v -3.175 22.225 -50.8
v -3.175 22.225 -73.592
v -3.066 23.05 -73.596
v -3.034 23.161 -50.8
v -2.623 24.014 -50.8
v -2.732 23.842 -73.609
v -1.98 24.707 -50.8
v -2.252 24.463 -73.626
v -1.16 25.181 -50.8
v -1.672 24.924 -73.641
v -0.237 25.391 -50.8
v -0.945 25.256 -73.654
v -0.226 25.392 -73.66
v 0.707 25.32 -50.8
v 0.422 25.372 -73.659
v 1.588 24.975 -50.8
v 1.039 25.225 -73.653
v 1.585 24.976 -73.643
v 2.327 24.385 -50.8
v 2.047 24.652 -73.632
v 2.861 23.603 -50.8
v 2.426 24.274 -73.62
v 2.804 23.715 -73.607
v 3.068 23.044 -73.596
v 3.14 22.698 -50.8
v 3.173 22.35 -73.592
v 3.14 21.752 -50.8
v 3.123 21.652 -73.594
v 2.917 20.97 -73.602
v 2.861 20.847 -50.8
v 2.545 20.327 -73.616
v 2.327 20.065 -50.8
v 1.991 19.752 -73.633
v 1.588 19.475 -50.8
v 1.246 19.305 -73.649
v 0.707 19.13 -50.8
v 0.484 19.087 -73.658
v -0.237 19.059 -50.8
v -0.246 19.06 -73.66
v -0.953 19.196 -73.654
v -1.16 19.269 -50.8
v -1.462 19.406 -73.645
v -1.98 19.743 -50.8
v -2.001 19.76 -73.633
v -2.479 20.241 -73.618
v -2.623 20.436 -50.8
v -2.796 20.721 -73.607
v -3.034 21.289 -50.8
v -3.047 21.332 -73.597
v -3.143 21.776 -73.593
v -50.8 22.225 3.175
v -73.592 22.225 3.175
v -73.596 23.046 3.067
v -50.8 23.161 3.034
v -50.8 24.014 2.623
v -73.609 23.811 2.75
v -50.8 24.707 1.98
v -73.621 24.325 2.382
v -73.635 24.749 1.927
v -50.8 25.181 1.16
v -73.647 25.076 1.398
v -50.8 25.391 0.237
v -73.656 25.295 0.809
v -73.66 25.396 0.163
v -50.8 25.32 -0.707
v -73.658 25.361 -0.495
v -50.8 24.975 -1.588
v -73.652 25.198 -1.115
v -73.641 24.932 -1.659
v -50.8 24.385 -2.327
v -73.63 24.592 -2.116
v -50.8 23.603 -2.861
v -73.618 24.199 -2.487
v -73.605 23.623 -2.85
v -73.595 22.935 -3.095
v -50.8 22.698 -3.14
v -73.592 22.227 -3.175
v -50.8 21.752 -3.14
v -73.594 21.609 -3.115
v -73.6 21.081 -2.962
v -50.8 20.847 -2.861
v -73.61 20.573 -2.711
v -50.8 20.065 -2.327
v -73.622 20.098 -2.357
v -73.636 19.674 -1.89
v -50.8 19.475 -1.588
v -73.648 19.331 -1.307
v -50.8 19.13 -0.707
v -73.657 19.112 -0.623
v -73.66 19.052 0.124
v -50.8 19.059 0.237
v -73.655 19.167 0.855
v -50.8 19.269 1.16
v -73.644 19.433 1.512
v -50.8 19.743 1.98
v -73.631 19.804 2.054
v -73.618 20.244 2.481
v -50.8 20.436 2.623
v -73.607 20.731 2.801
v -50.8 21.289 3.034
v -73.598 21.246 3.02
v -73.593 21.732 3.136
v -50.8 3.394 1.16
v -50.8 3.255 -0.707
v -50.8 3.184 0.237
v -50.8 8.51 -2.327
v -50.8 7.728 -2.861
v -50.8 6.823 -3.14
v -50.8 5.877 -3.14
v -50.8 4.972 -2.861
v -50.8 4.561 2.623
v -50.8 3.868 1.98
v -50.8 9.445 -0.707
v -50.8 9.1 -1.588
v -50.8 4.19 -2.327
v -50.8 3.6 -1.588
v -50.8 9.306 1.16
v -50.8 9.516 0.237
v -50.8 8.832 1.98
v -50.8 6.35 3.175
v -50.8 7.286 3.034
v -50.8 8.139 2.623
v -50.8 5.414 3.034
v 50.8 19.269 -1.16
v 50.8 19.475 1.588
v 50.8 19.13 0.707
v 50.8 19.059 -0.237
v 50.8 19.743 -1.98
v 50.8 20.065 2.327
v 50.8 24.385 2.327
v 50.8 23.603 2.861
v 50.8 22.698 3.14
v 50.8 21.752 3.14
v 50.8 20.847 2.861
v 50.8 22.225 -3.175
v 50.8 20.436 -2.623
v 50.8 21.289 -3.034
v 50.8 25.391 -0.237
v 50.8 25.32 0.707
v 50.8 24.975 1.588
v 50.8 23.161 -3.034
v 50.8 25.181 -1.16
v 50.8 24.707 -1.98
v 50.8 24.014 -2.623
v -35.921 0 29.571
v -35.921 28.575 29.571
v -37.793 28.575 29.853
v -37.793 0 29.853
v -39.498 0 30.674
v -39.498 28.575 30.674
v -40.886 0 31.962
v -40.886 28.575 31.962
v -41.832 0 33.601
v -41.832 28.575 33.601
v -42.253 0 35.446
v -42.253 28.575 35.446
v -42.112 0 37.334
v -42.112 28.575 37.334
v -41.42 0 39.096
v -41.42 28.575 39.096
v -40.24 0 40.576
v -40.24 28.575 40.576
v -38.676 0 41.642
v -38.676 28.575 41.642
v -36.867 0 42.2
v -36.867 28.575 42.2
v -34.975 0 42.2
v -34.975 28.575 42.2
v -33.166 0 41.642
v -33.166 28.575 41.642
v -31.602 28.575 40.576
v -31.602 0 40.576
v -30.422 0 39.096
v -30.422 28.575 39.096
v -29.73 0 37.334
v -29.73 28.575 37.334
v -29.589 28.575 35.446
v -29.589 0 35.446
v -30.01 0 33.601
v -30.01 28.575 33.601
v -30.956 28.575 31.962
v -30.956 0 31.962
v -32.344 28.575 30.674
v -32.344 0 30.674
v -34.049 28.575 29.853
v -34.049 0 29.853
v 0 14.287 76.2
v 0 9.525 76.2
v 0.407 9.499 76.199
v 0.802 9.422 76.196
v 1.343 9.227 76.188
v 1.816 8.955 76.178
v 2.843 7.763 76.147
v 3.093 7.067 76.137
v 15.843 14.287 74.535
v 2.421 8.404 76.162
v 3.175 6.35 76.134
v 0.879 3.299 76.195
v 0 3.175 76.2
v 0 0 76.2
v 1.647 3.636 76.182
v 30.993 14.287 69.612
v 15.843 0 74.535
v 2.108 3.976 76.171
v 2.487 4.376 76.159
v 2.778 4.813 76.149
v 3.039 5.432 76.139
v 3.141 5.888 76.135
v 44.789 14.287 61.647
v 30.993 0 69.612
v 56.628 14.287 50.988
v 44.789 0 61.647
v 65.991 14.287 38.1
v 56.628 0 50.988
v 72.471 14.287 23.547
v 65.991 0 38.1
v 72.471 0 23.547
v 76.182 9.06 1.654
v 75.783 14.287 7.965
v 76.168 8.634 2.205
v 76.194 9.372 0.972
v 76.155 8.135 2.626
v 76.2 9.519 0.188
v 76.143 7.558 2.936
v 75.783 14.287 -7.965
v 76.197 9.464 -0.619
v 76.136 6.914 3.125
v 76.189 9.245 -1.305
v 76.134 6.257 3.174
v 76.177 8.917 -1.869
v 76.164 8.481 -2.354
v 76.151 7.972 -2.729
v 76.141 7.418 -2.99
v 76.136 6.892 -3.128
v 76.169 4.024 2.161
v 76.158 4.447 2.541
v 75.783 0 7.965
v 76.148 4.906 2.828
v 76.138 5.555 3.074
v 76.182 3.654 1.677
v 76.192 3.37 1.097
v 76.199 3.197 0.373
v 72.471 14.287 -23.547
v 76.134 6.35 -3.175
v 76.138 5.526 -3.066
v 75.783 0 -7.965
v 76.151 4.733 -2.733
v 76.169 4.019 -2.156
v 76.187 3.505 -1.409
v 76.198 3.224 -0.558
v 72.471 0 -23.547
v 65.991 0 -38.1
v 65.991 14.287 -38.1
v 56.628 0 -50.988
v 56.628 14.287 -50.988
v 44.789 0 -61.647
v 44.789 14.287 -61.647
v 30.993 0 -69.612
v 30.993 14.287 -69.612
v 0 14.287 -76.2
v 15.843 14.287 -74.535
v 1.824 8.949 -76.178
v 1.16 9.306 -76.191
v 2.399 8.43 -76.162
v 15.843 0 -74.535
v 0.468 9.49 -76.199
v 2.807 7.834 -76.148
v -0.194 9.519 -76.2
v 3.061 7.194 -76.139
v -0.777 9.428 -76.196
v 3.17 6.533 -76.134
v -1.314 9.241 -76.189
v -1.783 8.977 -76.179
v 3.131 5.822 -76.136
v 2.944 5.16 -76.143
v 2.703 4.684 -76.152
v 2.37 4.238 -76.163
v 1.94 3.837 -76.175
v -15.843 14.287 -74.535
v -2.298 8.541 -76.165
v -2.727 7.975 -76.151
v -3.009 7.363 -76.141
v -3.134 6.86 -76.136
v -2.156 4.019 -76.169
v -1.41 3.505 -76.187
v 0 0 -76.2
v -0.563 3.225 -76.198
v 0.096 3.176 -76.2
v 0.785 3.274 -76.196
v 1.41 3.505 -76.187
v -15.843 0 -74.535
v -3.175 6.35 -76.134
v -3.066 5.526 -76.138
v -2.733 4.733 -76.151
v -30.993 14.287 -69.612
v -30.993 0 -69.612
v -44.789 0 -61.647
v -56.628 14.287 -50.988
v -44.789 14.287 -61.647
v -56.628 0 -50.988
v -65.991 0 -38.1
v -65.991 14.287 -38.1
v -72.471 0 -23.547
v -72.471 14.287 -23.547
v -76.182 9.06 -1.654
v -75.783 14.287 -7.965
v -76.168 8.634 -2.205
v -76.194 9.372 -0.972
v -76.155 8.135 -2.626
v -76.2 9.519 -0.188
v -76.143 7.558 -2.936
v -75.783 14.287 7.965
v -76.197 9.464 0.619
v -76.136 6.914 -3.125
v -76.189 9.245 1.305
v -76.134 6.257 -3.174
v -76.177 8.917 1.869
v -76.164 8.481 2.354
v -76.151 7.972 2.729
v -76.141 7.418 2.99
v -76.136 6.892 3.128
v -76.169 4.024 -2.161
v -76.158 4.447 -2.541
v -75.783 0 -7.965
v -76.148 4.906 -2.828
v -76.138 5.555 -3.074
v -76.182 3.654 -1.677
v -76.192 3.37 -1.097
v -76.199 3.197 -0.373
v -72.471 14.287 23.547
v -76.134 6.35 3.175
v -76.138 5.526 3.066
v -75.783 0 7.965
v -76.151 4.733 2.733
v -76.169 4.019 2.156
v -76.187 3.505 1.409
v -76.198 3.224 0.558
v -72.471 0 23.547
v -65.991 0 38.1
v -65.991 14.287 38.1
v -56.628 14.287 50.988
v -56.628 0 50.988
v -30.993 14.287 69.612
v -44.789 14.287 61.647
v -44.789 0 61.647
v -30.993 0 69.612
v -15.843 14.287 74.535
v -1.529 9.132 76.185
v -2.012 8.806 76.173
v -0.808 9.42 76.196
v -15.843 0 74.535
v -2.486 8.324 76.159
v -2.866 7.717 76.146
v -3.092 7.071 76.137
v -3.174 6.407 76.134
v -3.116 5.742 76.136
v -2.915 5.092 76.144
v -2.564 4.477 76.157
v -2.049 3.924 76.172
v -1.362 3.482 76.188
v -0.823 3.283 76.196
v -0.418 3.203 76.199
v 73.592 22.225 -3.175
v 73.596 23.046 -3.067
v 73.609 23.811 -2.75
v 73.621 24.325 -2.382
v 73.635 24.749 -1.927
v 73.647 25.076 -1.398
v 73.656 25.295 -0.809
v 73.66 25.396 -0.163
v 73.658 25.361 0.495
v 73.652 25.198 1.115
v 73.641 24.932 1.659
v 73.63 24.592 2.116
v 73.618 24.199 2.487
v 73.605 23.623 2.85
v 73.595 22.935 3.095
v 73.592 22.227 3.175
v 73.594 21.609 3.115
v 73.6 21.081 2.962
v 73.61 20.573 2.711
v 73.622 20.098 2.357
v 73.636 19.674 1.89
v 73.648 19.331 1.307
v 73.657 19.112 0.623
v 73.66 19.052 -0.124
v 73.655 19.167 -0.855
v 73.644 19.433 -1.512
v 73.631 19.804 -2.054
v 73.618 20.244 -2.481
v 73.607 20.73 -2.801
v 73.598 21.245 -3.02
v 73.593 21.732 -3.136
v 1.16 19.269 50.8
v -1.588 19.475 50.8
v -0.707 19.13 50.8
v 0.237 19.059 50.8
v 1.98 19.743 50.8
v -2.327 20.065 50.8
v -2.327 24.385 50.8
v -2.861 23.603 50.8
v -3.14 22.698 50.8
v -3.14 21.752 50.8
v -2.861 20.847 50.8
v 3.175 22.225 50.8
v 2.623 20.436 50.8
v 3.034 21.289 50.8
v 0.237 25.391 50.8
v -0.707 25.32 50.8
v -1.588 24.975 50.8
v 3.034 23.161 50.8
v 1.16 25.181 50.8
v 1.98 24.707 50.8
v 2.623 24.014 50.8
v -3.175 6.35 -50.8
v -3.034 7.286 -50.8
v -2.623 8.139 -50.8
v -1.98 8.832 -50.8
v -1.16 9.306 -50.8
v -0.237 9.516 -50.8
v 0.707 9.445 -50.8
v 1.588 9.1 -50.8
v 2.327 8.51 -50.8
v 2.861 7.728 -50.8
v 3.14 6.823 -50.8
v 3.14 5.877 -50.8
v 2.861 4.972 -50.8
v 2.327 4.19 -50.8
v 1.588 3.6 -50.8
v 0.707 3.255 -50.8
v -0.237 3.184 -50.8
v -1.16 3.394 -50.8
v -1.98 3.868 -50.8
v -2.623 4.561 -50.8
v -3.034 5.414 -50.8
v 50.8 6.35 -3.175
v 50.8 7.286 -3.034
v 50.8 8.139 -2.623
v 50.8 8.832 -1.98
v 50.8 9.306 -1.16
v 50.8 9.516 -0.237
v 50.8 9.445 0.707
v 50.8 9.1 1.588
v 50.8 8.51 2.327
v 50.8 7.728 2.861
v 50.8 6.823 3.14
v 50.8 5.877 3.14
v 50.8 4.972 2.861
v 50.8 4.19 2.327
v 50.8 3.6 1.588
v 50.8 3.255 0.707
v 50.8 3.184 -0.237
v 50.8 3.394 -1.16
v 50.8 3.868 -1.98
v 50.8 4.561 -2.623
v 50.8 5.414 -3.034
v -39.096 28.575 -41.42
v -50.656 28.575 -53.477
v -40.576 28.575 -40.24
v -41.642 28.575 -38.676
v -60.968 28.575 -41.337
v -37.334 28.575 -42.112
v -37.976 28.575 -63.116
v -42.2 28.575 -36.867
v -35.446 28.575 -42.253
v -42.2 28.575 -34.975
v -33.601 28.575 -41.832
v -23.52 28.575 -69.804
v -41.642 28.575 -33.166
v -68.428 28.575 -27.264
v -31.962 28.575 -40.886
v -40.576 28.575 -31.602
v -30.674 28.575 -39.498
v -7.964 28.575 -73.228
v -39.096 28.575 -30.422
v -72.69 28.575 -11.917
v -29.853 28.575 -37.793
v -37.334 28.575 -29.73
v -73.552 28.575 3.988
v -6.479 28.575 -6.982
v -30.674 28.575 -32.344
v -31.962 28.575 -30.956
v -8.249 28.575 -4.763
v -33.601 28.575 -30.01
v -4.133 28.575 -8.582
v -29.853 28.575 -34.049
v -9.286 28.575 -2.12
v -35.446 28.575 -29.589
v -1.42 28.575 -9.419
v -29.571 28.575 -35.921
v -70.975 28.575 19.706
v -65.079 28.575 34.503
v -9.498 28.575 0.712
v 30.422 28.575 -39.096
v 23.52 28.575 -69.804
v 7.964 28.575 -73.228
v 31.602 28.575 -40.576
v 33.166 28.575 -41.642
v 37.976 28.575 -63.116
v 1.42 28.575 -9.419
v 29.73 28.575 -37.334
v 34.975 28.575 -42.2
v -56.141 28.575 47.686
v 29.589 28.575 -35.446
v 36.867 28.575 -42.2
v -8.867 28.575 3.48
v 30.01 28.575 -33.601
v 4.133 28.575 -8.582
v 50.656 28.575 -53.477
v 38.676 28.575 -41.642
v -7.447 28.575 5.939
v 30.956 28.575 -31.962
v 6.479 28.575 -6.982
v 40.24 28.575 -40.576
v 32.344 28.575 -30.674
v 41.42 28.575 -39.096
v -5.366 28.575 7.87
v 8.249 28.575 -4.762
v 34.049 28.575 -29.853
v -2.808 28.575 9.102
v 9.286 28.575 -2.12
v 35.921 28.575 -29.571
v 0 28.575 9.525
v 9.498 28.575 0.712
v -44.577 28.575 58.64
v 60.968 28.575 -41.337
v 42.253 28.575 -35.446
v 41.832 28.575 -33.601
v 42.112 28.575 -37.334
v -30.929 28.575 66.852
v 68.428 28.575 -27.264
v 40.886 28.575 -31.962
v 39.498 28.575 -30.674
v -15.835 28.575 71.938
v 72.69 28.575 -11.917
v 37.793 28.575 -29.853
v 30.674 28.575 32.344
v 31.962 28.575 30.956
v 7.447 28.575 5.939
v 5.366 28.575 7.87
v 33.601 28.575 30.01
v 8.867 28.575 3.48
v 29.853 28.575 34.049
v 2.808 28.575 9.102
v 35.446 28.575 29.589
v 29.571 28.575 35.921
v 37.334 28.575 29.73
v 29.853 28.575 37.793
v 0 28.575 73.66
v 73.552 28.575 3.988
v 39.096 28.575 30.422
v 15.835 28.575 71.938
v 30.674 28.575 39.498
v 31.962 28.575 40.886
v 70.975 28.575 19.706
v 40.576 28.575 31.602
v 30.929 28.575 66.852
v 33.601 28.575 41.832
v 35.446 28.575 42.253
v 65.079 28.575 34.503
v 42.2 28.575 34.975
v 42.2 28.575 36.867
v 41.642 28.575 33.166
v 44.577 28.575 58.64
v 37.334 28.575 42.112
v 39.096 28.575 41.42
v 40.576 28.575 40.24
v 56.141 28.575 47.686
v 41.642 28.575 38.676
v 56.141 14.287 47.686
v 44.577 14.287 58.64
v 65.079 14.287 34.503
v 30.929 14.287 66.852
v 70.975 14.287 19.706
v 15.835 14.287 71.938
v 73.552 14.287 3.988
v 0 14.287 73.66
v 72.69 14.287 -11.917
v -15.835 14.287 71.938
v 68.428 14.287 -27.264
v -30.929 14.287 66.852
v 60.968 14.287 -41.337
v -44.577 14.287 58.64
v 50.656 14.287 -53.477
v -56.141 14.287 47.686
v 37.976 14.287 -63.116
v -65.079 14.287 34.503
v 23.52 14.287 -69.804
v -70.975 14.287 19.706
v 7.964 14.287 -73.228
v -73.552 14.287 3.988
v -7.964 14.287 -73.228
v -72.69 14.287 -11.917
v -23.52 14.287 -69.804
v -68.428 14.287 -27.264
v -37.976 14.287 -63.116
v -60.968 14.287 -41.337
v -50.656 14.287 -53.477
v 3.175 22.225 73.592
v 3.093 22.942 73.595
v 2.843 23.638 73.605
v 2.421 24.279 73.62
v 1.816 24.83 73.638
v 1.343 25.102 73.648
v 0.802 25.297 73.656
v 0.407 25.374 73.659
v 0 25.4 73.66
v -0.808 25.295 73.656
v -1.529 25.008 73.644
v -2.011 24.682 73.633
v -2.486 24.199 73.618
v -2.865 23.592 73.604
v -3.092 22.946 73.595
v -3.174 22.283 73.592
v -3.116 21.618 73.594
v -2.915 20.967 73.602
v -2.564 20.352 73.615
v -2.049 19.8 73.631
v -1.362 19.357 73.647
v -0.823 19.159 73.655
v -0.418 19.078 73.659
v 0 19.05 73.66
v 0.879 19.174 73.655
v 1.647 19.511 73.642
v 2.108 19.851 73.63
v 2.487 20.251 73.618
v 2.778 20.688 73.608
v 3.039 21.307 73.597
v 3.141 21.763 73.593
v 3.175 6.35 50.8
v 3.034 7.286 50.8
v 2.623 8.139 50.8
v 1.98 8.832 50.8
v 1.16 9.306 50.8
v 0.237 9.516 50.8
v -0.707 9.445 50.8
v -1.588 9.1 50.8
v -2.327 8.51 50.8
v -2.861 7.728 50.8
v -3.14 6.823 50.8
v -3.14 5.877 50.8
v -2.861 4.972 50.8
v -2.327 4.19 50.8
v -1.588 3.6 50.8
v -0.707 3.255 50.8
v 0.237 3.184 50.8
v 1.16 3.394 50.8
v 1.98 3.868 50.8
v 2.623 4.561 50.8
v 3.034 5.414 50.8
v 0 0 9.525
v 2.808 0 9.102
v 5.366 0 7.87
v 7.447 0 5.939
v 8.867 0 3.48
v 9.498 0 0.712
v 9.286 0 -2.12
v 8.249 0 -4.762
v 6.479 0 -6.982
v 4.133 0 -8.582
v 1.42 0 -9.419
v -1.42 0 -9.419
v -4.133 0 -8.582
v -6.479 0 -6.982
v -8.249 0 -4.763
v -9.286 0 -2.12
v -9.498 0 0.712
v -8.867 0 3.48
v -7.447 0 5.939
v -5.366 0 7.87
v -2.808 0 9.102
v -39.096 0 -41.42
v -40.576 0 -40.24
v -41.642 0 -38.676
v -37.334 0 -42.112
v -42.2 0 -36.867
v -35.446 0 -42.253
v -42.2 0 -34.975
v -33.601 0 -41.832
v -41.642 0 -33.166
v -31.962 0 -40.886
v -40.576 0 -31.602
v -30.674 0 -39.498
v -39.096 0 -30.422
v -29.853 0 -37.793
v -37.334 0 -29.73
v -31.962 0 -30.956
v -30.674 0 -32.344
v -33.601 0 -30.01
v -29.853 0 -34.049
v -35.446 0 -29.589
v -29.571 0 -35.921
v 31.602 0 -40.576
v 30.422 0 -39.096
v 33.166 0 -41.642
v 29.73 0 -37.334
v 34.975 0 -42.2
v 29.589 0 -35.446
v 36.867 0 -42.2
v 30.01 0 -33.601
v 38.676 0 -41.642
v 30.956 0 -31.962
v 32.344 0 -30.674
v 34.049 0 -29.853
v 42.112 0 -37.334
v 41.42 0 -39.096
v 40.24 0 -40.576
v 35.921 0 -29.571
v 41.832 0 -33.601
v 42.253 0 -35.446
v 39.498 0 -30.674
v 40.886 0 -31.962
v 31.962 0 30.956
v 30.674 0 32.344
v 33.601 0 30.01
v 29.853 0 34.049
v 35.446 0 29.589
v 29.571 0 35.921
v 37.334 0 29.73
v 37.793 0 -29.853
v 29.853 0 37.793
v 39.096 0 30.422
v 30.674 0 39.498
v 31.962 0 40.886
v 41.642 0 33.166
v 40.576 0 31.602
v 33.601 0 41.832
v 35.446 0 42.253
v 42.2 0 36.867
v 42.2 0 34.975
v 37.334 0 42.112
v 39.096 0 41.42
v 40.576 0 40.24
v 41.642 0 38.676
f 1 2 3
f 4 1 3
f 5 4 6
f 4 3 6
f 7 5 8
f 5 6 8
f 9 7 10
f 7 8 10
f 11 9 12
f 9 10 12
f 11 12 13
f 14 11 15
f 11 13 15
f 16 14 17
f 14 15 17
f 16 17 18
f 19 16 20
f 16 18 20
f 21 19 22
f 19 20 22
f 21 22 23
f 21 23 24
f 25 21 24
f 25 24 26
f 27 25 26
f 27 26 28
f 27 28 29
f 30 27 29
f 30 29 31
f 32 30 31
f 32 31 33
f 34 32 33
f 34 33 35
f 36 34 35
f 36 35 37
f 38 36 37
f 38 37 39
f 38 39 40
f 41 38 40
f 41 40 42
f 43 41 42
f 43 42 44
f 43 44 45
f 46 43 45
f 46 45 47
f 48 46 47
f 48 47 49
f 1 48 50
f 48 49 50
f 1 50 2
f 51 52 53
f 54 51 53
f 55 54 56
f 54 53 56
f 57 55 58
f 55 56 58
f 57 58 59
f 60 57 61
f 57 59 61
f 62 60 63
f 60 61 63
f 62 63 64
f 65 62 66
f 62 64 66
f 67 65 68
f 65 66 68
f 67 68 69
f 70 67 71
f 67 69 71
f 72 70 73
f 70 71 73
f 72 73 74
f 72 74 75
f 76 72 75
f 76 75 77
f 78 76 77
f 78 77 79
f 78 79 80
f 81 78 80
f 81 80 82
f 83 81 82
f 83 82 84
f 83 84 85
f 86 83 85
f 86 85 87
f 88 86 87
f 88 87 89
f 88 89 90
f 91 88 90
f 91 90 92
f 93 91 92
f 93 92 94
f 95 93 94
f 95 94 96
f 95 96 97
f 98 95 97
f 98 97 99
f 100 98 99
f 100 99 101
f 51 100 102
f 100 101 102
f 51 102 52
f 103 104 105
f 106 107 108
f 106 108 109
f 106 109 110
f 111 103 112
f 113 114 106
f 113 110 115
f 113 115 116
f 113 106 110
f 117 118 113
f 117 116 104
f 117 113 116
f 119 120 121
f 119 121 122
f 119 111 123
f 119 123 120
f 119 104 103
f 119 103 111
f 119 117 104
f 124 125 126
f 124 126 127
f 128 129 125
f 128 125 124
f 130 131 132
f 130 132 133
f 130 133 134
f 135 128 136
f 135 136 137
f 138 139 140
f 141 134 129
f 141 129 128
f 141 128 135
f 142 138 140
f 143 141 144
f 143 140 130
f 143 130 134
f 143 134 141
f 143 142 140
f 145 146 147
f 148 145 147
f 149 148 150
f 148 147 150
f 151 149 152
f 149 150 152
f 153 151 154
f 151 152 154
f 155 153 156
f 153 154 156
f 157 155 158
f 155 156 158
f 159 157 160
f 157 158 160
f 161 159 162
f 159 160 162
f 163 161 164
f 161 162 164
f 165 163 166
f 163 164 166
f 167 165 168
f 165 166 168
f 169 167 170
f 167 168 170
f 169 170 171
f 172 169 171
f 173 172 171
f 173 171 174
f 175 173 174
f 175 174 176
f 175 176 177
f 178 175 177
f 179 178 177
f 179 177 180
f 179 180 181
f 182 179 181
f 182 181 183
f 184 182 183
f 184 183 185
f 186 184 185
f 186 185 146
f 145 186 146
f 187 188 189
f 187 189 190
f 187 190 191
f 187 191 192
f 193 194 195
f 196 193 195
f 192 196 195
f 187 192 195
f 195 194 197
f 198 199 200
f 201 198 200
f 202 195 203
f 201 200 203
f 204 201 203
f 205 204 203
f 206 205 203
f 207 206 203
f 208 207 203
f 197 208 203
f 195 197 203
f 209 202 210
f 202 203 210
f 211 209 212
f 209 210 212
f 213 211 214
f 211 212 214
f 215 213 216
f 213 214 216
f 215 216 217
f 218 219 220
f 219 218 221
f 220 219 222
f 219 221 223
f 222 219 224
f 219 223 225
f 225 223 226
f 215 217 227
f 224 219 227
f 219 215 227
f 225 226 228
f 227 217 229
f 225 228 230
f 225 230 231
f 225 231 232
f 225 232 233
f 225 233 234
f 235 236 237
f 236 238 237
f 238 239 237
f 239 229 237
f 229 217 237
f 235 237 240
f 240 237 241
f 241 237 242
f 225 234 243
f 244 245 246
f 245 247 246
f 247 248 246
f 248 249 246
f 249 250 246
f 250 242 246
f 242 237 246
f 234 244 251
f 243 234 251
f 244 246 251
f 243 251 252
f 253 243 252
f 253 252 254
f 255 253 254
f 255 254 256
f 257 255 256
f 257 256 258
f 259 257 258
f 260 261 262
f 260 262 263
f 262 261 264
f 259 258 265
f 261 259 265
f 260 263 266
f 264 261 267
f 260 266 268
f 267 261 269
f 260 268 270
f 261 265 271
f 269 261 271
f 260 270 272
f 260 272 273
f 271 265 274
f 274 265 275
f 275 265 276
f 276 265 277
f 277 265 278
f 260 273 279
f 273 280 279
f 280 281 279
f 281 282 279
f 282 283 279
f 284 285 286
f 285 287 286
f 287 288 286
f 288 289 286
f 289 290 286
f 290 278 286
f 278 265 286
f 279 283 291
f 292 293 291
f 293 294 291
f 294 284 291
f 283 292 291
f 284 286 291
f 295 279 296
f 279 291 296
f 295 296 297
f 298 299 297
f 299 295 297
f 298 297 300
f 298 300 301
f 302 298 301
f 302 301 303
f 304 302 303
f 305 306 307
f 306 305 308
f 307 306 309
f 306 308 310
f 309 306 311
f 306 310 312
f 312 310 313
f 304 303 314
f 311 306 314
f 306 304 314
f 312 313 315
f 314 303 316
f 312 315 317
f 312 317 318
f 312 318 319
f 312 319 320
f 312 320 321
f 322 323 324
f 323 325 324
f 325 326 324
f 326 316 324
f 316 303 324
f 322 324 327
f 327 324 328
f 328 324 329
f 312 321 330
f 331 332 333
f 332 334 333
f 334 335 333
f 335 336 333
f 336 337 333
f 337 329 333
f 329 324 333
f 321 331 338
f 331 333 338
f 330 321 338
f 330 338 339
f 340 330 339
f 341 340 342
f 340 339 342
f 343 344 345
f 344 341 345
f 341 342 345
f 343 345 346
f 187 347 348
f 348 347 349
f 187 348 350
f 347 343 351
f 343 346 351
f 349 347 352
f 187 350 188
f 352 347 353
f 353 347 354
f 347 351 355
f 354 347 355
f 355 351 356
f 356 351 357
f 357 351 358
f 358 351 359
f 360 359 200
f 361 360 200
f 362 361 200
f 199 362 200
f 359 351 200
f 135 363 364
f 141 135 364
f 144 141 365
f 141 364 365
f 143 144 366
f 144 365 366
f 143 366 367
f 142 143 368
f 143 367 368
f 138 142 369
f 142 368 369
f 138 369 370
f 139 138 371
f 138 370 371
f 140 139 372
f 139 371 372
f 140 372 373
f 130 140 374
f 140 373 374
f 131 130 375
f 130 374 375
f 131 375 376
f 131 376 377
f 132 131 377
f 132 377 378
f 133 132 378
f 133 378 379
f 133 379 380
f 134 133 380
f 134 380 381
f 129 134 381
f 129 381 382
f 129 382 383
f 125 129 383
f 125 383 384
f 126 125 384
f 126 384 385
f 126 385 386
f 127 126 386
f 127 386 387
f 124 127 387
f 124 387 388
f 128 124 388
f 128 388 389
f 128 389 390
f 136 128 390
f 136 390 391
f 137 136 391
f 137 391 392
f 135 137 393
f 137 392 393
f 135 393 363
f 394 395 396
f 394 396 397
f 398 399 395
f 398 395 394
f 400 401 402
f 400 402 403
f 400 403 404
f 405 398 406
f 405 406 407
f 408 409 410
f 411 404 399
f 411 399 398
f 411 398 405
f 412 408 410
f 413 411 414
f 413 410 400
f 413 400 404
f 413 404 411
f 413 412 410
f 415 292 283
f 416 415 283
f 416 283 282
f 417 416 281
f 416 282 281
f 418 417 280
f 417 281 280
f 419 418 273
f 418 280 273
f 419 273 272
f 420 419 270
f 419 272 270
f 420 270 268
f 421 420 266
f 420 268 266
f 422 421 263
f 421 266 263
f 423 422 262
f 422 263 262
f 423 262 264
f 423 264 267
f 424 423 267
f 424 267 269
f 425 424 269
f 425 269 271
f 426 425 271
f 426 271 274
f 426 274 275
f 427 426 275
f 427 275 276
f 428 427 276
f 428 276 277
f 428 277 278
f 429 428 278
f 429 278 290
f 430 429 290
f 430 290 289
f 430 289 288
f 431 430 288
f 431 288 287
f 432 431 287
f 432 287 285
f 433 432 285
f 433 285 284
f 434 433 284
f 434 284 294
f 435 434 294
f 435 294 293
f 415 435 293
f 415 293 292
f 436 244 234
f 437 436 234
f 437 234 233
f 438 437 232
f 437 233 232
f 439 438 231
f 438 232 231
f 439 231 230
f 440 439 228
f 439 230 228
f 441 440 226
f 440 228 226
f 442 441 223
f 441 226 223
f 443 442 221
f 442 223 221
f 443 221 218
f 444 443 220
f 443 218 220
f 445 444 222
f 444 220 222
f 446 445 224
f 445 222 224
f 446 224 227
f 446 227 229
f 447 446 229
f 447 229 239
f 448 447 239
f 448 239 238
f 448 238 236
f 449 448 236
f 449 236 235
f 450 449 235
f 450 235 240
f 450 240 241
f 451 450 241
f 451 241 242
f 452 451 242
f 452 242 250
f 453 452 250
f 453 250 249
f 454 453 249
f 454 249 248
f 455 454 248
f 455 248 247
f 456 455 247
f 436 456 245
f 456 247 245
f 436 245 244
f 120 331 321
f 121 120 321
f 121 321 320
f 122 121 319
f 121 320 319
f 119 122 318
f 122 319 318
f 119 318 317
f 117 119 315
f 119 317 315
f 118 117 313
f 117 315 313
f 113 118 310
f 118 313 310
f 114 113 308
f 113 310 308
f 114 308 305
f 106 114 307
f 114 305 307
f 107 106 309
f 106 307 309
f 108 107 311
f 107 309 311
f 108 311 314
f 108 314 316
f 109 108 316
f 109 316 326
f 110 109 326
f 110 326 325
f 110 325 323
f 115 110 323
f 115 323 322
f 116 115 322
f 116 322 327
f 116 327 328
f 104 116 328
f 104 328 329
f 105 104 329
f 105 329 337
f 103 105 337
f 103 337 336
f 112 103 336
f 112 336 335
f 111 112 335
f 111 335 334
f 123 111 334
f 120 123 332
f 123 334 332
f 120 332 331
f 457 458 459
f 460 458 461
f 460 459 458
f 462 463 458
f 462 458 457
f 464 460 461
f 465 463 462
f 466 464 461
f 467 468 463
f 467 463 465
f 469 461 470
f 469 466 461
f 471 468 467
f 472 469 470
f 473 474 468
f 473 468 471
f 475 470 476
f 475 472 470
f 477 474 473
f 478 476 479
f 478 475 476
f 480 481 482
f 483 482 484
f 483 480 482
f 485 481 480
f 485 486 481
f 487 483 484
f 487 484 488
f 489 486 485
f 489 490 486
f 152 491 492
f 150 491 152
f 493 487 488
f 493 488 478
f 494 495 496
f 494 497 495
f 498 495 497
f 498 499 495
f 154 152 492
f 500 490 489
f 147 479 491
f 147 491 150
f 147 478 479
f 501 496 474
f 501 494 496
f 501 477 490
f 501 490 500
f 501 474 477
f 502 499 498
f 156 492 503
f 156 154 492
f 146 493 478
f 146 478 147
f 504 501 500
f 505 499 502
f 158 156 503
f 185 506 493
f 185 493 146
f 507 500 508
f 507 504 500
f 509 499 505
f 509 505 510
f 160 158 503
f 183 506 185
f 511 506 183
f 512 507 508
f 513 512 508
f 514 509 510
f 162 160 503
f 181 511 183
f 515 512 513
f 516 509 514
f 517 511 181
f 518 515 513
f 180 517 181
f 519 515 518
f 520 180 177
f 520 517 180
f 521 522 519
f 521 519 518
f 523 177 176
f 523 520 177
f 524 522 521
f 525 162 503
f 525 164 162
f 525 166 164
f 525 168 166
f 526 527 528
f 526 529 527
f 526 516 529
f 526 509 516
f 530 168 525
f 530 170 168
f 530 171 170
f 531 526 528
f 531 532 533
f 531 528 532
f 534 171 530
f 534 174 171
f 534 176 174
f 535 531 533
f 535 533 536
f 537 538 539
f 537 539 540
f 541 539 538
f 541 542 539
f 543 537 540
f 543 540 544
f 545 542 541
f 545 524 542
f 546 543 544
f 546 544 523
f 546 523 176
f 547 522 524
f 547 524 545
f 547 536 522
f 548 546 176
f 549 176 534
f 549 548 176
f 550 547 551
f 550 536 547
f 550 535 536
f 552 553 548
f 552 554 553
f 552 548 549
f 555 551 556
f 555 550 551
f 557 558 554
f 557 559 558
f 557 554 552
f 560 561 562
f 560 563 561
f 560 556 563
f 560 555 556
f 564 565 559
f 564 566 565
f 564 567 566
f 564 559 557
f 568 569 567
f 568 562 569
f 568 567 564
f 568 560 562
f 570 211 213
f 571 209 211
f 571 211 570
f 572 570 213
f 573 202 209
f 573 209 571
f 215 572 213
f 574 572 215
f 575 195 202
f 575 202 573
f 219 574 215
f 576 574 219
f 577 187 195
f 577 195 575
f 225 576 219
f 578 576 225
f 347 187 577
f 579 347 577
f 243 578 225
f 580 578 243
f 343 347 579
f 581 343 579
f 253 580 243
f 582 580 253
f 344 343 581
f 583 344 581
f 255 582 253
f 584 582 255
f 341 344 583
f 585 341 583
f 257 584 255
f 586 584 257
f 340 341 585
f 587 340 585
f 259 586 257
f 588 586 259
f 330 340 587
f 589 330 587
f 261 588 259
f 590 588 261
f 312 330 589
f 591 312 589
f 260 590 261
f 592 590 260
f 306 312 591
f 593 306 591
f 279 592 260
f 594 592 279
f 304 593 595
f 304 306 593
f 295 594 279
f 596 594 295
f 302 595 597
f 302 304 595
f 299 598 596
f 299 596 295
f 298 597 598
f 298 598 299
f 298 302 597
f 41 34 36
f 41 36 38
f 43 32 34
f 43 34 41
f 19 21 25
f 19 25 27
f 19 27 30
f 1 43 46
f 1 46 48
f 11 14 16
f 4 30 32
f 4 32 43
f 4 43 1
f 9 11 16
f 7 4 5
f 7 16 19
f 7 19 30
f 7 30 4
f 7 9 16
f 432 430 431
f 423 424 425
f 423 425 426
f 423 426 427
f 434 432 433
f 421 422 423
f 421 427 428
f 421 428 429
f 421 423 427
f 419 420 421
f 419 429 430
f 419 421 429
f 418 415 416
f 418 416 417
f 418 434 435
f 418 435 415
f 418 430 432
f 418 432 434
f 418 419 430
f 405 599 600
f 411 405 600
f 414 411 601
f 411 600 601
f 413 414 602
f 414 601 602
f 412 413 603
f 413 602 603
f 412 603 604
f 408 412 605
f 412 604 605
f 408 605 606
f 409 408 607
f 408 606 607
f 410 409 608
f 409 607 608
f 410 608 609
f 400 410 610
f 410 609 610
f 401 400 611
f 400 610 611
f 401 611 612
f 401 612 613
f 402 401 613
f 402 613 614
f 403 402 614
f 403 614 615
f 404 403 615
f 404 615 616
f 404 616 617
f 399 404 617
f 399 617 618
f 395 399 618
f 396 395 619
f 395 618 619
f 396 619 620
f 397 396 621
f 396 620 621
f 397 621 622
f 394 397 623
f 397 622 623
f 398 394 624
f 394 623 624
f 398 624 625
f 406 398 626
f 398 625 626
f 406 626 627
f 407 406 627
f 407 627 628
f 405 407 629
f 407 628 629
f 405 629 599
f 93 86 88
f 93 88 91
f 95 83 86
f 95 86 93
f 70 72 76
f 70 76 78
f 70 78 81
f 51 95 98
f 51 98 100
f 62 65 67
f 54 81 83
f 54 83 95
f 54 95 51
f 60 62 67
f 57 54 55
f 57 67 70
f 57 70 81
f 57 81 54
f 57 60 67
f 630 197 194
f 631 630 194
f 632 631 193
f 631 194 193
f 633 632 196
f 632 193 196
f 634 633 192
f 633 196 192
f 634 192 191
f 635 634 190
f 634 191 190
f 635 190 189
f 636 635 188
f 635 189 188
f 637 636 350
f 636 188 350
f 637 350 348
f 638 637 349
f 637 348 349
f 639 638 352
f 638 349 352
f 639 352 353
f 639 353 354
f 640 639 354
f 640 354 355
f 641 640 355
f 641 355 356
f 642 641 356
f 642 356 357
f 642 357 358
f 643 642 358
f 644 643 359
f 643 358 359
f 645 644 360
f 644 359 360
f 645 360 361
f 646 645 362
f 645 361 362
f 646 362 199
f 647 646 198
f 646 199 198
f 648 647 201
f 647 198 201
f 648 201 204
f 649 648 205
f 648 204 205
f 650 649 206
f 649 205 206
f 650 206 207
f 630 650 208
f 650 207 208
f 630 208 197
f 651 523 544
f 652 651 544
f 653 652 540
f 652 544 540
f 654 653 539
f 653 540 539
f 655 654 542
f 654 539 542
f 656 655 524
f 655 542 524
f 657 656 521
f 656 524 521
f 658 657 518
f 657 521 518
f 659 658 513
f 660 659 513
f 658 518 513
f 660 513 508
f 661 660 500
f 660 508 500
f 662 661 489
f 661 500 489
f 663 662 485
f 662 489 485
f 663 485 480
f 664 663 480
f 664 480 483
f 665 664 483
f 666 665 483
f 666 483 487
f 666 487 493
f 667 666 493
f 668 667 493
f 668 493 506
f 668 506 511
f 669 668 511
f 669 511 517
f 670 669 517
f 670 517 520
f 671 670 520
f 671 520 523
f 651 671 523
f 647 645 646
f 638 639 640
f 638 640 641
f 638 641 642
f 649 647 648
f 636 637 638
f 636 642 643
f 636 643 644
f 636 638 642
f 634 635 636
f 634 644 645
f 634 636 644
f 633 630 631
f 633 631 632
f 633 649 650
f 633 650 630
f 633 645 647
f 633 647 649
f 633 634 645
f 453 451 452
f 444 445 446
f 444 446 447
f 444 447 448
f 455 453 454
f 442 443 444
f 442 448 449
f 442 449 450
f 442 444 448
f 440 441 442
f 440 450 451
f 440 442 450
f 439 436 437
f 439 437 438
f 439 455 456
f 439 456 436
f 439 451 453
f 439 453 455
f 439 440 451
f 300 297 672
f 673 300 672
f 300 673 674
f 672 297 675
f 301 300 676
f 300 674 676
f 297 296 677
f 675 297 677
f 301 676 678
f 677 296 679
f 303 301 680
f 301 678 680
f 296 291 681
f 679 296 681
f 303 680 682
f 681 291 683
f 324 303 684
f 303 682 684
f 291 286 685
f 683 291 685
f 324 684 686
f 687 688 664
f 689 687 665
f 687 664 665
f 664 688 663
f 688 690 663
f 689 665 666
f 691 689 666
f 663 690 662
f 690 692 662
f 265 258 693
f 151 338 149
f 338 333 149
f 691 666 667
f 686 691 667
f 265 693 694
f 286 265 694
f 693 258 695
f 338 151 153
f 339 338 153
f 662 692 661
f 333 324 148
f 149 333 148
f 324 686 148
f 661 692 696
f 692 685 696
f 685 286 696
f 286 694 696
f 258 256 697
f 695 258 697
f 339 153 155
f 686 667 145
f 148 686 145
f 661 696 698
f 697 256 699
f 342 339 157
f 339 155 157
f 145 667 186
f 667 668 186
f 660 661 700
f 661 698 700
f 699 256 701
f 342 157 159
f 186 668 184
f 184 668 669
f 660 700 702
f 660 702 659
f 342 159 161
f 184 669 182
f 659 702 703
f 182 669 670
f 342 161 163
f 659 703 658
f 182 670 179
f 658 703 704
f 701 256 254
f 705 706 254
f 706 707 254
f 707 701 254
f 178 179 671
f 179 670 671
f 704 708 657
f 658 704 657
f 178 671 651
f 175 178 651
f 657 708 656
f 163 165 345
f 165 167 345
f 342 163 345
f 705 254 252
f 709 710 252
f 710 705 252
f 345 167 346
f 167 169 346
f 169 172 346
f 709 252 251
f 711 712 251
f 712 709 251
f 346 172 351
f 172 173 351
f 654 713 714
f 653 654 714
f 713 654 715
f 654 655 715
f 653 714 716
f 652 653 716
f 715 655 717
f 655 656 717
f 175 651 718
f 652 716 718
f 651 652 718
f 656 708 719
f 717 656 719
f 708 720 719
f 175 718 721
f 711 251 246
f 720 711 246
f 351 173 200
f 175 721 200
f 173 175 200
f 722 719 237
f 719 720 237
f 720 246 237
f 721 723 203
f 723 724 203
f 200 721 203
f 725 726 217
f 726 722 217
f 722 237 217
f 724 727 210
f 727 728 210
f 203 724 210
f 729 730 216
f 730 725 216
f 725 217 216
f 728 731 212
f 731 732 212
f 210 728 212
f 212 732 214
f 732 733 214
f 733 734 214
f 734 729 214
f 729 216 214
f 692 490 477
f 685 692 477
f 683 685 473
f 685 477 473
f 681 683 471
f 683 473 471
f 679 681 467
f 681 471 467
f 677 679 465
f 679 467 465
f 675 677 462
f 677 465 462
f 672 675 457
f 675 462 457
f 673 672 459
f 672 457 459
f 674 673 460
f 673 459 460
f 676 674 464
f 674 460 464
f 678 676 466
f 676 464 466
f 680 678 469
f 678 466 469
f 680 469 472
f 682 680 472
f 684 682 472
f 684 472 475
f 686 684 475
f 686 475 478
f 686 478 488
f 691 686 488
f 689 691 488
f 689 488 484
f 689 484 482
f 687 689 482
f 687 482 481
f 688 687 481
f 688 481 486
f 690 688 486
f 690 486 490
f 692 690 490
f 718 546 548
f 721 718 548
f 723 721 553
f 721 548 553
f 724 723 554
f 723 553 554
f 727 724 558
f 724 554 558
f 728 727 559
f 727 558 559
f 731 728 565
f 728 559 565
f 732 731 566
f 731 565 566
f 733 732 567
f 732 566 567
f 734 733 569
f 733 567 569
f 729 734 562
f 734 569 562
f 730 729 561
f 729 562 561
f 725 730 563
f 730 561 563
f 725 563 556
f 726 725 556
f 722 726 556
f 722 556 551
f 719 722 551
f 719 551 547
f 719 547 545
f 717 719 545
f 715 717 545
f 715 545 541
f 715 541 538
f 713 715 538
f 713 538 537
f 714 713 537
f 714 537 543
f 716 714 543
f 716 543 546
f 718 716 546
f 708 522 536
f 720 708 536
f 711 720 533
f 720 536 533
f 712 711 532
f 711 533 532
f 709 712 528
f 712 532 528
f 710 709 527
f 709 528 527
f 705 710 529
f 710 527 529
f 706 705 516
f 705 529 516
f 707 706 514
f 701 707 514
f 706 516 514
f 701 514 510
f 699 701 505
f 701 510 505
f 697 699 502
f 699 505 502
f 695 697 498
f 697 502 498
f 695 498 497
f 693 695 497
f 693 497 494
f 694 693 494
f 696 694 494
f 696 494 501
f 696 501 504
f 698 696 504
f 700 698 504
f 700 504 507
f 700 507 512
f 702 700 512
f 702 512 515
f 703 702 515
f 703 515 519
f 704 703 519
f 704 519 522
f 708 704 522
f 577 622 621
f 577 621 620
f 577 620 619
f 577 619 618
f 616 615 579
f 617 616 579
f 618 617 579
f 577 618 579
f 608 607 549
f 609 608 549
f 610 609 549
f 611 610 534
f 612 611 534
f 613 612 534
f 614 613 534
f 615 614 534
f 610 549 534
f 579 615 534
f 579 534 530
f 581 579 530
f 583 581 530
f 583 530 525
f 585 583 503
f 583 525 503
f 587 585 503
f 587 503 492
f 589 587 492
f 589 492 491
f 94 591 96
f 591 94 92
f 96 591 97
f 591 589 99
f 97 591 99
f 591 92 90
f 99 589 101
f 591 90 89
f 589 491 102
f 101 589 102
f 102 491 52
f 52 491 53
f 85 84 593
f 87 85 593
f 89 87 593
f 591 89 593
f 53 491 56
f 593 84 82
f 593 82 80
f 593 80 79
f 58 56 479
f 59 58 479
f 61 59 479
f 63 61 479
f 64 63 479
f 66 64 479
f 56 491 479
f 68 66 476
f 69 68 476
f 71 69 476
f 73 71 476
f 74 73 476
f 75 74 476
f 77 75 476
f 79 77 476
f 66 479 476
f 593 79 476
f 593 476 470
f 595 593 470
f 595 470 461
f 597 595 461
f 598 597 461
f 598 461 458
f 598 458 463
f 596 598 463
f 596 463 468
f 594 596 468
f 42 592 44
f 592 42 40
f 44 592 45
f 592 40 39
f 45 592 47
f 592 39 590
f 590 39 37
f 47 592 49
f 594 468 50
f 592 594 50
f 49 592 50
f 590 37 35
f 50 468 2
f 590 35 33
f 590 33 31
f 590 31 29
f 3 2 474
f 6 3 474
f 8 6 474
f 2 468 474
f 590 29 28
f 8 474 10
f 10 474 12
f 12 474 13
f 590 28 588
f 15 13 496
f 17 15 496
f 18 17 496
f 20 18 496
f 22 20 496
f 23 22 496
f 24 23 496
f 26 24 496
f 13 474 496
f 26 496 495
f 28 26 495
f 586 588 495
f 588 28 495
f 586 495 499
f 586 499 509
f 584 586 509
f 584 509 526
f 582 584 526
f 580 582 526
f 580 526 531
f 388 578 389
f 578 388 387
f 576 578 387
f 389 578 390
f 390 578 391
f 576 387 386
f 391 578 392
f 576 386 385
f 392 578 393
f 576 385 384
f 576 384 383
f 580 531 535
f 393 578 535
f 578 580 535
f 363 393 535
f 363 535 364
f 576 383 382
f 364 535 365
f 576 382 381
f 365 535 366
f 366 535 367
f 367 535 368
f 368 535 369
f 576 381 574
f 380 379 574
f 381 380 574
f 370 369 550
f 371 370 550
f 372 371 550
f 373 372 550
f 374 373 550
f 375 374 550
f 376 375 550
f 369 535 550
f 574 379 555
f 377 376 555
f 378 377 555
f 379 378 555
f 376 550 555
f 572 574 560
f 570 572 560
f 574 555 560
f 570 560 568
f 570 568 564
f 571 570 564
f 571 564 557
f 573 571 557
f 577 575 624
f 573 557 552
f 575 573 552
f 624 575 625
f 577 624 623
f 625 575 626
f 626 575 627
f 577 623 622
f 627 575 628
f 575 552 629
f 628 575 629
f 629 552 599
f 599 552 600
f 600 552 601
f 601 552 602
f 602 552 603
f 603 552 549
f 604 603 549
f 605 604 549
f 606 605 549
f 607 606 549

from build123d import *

# Parameters (mm, degrees)
SKETCH1_R           = 76.2
BOSS_EXTRUDE1_DEPTH = 28.575
SKETCH2_R           = 9.525
CUT_EXTRUDE1_DEPTH  = 112.48726665
SKETCH30_R          = 3.175
CUT_EXTRUDE2_DEPTH  = 25.4
CIRPATTERN3_COUNT   = 4
SKETCH31_R          = 6.35
CUT_EXTRUDE3_DEPTH  = 112.487266812
CIRPATTERN4_COUNT   = 4
SKETCH34_W          = 2.54
SKETCH34_H          = 14.2875


with BuildPart() as part:
    # Sketch1 → Boss-Extrude1 (new body)
    with BuildSketch(Plane(origin=(0, 0, 0), x_dir=(1, 0, 0), z_dir=(0, 1, 0))):
        with Locations(Location((0, 0, 0), (0, 0, 270))):
            Circle(SKETCH1_R)
    extrude(amount=BOSS_EXTRUDE1_DEPTH)

    # Sketch2 → Cut-Extrude1 (cut, through all)
    with BuildSketch(Plane(origin=(0, 28.575, 0), x_dir=(1, 0, 0), z_dir=(0, 1, 0))):
        with Locations(Location((0, 0, 0), (0, 0, 270))):
            Circle(SKETCH2_R)
    extrude(amount=-CUT_EXTRUDE1_DEPTH, mode=Mode.SUBTRACT)

    # Sketch30 → Cut-Extrude2 (cut)
    with BuildSketch(Plane.XY.offset(76.2)):
        with Locations((0, 22.225)):
            Circle(SKETCH30_R)
        with Locations((0, 6.35)):
            Circle(SKETCH30_R)
    cut_extrude2 = extrude(amount=-CUT_EXTRUDE2_DEPTH, mode=Mode.SUBTRACT)

    # CirPattern3: Cut-Extrude2 ×4 about axis
    cirpattern3_axis = Axis((0, 0, 0), (0, 1, 0))
    for i in range(1, CIRPATTERN3_COUNT):
        add(cut_extrude2.rotate(cirpattern3_axis, i * 360 / CIRPATTERN3_COUNT), mode=Mode.SUBTRACT)

    # Sketch31 → Cut-Extrude3 (cut, through all)
    with BuildSketch(Plane(origin=(0, 28.575, 0), x_dir=(1, 0, 0), z_dir=(0, 1, 0))):
        with Locations(Location((35.921024484, 35.921024484, 0), (0, 0, 270))):
            Circle(SKETCH31_R)
    cut_extrude3 = extrude(amount=-CUT_EXTRUDE3_DEPTH, mode=Mode.SUBTRACT)

    # CirPattern4: Cut-Extrude3 ×4 about axis
    cirpattern4_axis = Axis((0, 0, 0), (0, 1, 0))
    for i in range(1, CIRPATTERN4_COUNT):
        add(cut_extrude3.rotate(cirpattern4_axis, i * 360 / CIRPATTERN4_COUNT), mode=Mode.SUBTRACT)

    # Sketch34 → Cut-Revolve1 (revolve, cut)
    with BuildSketch(Plane.XY, mode=Mode.PRIVATE) as cut_revolve1_sk:
        with Locations((74.93, 21.43125)):
            Rectangle(SKETCH34_W, SKETCH34_H)
    revolve(cut_revolve1_sk.sketch.rotate(Axis((0, 28.575, 0), (0, -1, 0)), 90), axis=Axis((0, 28.575, 0), (0, -1, 0)), mode=Mode.SUBTRACT)


solid = part.part
